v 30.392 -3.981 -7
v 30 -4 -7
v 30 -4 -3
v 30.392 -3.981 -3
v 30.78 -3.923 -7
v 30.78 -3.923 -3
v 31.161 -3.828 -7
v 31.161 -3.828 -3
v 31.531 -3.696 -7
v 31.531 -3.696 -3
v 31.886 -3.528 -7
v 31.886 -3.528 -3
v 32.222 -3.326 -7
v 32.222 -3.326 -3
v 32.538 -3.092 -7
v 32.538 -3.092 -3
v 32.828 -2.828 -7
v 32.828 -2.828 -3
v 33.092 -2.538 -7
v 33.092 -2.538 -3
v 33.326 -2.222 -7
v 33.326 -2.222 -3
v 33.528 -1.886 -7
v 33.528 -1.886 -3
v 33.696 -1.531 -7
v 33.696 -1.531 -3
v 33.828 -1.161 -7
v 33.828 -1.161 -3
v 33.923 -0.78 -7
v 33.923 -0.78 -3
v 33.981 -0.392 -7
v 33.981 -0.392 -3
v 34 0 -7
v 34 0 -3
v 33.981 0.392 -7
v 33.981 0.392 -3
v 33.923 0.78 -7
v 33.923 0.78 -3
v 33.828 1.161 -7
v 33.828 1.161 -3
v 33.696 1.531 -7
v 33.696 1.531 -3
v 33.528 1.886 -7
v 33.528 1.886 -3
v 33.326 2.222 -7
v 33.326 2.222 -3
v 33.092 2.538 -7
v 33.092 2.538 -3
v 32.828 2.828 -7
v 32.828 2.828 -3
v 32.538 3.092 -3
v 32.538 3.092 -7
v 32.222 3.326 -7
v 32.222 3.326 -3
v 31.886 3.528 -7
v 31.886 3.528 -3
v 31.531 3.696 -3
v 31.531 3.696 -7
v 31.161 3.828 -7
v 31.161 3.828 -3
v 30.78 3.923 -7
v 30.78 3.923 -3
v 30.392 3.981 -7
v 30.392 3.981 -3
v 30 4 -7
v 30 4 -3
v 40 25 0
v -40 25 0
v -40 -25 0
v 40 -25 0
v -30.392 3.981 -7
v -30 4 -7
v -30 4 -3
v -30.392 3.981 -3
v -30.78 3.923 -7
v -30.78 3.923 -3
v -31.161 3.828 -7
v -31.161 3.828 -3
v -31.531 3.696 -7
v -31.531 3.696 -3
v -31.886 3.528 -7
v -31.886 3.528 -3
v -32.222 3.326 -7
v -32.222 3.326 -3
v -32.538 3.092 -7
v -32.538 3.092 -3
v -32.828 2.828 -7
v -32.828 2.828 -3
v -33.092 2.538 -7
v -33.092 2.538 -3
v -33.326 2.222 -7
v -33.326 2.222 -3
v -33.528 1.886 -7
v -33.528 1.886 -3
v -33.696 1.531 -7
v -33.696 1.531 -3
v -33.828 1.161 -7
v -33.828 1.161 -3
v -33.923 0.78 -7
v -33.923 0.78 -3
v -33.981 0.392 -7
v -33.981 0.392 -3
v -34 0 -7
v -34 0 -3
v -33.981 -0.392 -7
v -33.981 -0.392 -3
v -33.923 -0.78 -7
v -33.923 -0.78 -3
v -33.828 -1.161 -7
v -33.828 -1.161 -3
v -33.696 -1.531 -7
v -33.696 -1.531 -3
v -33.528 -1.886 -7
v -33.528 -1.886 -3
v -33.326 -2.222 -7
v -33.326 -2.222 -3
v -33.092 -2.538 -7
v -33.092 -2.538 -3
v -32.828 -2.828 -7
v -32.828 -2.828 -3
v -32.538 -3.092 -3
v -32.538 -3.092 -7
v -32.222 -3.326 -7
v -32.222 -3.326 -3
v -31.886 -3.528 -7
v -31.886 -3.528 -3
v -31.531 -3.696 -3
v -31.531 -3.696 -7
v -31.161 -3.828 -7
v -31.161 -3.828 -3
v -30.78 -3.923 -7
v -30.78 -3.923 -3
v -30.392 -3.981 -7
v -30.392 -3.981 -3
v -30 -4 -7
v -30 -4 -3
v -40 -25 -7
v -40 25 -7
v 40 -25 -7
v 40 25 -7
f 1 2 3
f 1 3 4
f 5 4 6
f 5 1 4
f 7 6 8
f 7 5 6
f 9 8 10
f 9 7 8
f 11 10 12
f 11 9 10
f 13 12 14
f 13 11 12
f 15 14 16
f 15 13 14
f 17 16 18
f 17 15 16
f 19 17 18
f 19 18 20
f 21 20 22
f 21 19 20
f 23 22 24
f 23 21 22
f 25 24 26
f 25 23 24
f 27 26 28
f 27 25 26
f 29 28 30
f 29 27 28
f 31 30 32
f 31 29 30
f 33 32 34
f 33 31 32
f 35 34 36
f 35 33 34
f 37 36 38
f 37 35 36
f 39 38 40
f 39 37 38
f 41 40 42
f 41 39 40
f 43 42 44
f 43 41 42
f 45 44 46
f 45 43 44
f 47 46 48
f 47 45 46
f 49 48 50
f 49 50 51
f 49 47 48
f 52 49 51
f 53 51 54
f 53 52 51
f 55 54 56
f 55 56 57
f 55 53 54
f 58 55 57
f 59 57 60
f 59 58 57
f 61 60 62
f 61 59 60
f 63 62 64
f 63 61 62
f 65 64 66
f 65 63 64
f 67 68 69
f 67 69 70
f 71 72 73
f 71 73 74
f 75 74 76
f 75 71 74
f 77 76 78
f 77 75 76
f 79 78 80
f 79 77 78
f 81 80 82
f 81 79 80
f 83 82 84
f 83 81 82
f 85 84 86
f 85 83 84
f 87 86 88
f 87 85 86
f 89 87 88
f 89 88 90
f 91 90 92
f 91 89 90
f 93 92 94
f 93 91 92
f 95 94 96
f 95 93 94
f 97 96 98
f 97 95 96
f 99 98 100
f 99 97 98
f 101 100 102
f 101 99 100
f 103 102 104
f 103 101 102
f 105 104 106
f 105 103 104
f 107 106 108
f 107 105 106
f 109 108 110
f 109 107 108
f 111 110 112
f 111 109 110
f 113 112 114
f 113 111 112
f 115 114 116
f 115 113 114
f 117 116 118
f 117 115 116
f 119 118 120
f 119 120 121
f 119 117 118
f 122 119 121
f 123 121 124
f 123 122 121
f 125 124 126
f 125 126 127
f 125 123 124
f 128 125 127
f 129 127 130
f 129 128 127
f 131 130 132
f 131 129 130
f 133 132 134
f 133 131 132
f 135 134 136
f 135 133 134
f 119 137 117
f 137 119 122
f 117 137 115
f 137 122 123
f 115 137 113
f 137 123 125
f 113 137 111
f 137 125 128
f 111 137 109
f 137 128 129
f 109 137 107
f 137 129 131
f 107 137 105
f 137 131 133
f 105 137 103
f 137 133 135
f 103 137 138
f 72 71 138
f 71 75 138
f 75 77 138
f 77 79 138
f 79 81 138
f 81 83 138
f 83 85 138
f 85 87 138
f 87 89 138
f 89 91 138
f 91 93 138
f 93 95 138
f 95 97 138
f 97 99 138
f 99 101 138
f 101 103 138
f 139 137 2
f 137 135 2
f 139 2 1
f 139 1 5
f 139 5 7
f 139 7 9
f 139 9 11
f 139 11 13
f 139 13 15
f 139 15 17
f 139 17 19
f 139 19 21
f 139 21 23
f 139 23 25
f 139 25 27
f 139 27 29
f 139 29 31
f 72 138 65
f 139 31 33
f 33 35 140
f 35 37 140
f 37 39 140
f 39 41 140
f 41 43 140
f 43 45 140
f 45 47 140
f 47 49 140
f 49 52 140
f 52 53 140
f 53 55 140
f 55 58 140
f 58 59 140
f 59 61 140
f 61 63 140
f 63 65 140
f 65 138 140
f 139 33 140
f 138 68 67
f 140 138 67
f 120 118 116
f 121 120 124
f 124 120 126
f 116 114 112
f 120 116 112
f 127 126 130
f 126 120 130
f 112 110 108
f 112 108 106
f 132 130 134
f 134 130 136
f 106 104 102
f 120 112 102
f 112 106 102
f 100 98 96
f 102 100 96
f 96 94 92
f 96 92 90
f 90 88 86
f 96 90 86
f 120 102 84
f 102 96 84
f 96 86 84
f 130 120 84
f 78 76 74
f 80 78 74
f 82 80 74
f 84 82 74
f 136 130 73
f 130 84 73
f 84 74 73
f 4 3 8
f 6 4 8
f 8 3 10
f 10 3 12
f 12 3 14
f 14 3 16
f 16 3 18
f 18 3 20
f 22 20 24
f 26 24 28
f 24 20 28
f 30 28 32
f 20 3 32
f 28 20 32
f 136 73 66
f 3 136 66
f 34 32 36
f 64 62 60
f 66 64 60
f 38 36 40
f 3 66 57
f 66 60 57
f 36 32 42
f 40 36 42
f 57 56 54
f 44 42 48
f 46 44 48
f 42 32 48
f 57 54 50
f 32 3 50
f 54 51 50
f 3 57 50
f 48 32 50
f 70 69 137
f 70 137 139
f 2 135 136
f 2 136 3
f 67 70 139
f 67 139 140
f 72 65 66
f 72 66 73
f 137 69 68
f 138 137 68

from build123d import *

# Parameters (mm, degrees)
SKETCH4_W           = 80
SKETCH4_H           = 50
BOSS_EXTRUDE2_DEPTH = 7
CUT_EXTRUDE2_DEPTH  = 4


with BuildPart() as part:
    # Sketch4 → Boss-Extrude2 (new body)
    with BuildSketch(Plane.XY):
        Rectangle(SKETCH4_W, SKETCH4_H)
    extrude(amount=-BOSS_EXTRUDE2_DEPTH)

    # Sketch8 → Cut-Extrude2 (cut)
    with BuildSketch(Plane(origin=(0, 0, -7), x_dir=(-1, 0, 0), z_dir=(0, 0, -1))):
        with BuildLine():
            Line((-30, 4), (30, 4))
            ThreePointArc((30, 4), (34, 0), (30, -4))
            Line((30, -4), (-30, -4))
            ThreePointArc((-30, -4), (-34, 0), (-30, 4))
        make_face()
    extrude(amount=-CUT_EXTRUDE2_DEPTH, mode=Mode.SUBTRACT)


solid = part.part
